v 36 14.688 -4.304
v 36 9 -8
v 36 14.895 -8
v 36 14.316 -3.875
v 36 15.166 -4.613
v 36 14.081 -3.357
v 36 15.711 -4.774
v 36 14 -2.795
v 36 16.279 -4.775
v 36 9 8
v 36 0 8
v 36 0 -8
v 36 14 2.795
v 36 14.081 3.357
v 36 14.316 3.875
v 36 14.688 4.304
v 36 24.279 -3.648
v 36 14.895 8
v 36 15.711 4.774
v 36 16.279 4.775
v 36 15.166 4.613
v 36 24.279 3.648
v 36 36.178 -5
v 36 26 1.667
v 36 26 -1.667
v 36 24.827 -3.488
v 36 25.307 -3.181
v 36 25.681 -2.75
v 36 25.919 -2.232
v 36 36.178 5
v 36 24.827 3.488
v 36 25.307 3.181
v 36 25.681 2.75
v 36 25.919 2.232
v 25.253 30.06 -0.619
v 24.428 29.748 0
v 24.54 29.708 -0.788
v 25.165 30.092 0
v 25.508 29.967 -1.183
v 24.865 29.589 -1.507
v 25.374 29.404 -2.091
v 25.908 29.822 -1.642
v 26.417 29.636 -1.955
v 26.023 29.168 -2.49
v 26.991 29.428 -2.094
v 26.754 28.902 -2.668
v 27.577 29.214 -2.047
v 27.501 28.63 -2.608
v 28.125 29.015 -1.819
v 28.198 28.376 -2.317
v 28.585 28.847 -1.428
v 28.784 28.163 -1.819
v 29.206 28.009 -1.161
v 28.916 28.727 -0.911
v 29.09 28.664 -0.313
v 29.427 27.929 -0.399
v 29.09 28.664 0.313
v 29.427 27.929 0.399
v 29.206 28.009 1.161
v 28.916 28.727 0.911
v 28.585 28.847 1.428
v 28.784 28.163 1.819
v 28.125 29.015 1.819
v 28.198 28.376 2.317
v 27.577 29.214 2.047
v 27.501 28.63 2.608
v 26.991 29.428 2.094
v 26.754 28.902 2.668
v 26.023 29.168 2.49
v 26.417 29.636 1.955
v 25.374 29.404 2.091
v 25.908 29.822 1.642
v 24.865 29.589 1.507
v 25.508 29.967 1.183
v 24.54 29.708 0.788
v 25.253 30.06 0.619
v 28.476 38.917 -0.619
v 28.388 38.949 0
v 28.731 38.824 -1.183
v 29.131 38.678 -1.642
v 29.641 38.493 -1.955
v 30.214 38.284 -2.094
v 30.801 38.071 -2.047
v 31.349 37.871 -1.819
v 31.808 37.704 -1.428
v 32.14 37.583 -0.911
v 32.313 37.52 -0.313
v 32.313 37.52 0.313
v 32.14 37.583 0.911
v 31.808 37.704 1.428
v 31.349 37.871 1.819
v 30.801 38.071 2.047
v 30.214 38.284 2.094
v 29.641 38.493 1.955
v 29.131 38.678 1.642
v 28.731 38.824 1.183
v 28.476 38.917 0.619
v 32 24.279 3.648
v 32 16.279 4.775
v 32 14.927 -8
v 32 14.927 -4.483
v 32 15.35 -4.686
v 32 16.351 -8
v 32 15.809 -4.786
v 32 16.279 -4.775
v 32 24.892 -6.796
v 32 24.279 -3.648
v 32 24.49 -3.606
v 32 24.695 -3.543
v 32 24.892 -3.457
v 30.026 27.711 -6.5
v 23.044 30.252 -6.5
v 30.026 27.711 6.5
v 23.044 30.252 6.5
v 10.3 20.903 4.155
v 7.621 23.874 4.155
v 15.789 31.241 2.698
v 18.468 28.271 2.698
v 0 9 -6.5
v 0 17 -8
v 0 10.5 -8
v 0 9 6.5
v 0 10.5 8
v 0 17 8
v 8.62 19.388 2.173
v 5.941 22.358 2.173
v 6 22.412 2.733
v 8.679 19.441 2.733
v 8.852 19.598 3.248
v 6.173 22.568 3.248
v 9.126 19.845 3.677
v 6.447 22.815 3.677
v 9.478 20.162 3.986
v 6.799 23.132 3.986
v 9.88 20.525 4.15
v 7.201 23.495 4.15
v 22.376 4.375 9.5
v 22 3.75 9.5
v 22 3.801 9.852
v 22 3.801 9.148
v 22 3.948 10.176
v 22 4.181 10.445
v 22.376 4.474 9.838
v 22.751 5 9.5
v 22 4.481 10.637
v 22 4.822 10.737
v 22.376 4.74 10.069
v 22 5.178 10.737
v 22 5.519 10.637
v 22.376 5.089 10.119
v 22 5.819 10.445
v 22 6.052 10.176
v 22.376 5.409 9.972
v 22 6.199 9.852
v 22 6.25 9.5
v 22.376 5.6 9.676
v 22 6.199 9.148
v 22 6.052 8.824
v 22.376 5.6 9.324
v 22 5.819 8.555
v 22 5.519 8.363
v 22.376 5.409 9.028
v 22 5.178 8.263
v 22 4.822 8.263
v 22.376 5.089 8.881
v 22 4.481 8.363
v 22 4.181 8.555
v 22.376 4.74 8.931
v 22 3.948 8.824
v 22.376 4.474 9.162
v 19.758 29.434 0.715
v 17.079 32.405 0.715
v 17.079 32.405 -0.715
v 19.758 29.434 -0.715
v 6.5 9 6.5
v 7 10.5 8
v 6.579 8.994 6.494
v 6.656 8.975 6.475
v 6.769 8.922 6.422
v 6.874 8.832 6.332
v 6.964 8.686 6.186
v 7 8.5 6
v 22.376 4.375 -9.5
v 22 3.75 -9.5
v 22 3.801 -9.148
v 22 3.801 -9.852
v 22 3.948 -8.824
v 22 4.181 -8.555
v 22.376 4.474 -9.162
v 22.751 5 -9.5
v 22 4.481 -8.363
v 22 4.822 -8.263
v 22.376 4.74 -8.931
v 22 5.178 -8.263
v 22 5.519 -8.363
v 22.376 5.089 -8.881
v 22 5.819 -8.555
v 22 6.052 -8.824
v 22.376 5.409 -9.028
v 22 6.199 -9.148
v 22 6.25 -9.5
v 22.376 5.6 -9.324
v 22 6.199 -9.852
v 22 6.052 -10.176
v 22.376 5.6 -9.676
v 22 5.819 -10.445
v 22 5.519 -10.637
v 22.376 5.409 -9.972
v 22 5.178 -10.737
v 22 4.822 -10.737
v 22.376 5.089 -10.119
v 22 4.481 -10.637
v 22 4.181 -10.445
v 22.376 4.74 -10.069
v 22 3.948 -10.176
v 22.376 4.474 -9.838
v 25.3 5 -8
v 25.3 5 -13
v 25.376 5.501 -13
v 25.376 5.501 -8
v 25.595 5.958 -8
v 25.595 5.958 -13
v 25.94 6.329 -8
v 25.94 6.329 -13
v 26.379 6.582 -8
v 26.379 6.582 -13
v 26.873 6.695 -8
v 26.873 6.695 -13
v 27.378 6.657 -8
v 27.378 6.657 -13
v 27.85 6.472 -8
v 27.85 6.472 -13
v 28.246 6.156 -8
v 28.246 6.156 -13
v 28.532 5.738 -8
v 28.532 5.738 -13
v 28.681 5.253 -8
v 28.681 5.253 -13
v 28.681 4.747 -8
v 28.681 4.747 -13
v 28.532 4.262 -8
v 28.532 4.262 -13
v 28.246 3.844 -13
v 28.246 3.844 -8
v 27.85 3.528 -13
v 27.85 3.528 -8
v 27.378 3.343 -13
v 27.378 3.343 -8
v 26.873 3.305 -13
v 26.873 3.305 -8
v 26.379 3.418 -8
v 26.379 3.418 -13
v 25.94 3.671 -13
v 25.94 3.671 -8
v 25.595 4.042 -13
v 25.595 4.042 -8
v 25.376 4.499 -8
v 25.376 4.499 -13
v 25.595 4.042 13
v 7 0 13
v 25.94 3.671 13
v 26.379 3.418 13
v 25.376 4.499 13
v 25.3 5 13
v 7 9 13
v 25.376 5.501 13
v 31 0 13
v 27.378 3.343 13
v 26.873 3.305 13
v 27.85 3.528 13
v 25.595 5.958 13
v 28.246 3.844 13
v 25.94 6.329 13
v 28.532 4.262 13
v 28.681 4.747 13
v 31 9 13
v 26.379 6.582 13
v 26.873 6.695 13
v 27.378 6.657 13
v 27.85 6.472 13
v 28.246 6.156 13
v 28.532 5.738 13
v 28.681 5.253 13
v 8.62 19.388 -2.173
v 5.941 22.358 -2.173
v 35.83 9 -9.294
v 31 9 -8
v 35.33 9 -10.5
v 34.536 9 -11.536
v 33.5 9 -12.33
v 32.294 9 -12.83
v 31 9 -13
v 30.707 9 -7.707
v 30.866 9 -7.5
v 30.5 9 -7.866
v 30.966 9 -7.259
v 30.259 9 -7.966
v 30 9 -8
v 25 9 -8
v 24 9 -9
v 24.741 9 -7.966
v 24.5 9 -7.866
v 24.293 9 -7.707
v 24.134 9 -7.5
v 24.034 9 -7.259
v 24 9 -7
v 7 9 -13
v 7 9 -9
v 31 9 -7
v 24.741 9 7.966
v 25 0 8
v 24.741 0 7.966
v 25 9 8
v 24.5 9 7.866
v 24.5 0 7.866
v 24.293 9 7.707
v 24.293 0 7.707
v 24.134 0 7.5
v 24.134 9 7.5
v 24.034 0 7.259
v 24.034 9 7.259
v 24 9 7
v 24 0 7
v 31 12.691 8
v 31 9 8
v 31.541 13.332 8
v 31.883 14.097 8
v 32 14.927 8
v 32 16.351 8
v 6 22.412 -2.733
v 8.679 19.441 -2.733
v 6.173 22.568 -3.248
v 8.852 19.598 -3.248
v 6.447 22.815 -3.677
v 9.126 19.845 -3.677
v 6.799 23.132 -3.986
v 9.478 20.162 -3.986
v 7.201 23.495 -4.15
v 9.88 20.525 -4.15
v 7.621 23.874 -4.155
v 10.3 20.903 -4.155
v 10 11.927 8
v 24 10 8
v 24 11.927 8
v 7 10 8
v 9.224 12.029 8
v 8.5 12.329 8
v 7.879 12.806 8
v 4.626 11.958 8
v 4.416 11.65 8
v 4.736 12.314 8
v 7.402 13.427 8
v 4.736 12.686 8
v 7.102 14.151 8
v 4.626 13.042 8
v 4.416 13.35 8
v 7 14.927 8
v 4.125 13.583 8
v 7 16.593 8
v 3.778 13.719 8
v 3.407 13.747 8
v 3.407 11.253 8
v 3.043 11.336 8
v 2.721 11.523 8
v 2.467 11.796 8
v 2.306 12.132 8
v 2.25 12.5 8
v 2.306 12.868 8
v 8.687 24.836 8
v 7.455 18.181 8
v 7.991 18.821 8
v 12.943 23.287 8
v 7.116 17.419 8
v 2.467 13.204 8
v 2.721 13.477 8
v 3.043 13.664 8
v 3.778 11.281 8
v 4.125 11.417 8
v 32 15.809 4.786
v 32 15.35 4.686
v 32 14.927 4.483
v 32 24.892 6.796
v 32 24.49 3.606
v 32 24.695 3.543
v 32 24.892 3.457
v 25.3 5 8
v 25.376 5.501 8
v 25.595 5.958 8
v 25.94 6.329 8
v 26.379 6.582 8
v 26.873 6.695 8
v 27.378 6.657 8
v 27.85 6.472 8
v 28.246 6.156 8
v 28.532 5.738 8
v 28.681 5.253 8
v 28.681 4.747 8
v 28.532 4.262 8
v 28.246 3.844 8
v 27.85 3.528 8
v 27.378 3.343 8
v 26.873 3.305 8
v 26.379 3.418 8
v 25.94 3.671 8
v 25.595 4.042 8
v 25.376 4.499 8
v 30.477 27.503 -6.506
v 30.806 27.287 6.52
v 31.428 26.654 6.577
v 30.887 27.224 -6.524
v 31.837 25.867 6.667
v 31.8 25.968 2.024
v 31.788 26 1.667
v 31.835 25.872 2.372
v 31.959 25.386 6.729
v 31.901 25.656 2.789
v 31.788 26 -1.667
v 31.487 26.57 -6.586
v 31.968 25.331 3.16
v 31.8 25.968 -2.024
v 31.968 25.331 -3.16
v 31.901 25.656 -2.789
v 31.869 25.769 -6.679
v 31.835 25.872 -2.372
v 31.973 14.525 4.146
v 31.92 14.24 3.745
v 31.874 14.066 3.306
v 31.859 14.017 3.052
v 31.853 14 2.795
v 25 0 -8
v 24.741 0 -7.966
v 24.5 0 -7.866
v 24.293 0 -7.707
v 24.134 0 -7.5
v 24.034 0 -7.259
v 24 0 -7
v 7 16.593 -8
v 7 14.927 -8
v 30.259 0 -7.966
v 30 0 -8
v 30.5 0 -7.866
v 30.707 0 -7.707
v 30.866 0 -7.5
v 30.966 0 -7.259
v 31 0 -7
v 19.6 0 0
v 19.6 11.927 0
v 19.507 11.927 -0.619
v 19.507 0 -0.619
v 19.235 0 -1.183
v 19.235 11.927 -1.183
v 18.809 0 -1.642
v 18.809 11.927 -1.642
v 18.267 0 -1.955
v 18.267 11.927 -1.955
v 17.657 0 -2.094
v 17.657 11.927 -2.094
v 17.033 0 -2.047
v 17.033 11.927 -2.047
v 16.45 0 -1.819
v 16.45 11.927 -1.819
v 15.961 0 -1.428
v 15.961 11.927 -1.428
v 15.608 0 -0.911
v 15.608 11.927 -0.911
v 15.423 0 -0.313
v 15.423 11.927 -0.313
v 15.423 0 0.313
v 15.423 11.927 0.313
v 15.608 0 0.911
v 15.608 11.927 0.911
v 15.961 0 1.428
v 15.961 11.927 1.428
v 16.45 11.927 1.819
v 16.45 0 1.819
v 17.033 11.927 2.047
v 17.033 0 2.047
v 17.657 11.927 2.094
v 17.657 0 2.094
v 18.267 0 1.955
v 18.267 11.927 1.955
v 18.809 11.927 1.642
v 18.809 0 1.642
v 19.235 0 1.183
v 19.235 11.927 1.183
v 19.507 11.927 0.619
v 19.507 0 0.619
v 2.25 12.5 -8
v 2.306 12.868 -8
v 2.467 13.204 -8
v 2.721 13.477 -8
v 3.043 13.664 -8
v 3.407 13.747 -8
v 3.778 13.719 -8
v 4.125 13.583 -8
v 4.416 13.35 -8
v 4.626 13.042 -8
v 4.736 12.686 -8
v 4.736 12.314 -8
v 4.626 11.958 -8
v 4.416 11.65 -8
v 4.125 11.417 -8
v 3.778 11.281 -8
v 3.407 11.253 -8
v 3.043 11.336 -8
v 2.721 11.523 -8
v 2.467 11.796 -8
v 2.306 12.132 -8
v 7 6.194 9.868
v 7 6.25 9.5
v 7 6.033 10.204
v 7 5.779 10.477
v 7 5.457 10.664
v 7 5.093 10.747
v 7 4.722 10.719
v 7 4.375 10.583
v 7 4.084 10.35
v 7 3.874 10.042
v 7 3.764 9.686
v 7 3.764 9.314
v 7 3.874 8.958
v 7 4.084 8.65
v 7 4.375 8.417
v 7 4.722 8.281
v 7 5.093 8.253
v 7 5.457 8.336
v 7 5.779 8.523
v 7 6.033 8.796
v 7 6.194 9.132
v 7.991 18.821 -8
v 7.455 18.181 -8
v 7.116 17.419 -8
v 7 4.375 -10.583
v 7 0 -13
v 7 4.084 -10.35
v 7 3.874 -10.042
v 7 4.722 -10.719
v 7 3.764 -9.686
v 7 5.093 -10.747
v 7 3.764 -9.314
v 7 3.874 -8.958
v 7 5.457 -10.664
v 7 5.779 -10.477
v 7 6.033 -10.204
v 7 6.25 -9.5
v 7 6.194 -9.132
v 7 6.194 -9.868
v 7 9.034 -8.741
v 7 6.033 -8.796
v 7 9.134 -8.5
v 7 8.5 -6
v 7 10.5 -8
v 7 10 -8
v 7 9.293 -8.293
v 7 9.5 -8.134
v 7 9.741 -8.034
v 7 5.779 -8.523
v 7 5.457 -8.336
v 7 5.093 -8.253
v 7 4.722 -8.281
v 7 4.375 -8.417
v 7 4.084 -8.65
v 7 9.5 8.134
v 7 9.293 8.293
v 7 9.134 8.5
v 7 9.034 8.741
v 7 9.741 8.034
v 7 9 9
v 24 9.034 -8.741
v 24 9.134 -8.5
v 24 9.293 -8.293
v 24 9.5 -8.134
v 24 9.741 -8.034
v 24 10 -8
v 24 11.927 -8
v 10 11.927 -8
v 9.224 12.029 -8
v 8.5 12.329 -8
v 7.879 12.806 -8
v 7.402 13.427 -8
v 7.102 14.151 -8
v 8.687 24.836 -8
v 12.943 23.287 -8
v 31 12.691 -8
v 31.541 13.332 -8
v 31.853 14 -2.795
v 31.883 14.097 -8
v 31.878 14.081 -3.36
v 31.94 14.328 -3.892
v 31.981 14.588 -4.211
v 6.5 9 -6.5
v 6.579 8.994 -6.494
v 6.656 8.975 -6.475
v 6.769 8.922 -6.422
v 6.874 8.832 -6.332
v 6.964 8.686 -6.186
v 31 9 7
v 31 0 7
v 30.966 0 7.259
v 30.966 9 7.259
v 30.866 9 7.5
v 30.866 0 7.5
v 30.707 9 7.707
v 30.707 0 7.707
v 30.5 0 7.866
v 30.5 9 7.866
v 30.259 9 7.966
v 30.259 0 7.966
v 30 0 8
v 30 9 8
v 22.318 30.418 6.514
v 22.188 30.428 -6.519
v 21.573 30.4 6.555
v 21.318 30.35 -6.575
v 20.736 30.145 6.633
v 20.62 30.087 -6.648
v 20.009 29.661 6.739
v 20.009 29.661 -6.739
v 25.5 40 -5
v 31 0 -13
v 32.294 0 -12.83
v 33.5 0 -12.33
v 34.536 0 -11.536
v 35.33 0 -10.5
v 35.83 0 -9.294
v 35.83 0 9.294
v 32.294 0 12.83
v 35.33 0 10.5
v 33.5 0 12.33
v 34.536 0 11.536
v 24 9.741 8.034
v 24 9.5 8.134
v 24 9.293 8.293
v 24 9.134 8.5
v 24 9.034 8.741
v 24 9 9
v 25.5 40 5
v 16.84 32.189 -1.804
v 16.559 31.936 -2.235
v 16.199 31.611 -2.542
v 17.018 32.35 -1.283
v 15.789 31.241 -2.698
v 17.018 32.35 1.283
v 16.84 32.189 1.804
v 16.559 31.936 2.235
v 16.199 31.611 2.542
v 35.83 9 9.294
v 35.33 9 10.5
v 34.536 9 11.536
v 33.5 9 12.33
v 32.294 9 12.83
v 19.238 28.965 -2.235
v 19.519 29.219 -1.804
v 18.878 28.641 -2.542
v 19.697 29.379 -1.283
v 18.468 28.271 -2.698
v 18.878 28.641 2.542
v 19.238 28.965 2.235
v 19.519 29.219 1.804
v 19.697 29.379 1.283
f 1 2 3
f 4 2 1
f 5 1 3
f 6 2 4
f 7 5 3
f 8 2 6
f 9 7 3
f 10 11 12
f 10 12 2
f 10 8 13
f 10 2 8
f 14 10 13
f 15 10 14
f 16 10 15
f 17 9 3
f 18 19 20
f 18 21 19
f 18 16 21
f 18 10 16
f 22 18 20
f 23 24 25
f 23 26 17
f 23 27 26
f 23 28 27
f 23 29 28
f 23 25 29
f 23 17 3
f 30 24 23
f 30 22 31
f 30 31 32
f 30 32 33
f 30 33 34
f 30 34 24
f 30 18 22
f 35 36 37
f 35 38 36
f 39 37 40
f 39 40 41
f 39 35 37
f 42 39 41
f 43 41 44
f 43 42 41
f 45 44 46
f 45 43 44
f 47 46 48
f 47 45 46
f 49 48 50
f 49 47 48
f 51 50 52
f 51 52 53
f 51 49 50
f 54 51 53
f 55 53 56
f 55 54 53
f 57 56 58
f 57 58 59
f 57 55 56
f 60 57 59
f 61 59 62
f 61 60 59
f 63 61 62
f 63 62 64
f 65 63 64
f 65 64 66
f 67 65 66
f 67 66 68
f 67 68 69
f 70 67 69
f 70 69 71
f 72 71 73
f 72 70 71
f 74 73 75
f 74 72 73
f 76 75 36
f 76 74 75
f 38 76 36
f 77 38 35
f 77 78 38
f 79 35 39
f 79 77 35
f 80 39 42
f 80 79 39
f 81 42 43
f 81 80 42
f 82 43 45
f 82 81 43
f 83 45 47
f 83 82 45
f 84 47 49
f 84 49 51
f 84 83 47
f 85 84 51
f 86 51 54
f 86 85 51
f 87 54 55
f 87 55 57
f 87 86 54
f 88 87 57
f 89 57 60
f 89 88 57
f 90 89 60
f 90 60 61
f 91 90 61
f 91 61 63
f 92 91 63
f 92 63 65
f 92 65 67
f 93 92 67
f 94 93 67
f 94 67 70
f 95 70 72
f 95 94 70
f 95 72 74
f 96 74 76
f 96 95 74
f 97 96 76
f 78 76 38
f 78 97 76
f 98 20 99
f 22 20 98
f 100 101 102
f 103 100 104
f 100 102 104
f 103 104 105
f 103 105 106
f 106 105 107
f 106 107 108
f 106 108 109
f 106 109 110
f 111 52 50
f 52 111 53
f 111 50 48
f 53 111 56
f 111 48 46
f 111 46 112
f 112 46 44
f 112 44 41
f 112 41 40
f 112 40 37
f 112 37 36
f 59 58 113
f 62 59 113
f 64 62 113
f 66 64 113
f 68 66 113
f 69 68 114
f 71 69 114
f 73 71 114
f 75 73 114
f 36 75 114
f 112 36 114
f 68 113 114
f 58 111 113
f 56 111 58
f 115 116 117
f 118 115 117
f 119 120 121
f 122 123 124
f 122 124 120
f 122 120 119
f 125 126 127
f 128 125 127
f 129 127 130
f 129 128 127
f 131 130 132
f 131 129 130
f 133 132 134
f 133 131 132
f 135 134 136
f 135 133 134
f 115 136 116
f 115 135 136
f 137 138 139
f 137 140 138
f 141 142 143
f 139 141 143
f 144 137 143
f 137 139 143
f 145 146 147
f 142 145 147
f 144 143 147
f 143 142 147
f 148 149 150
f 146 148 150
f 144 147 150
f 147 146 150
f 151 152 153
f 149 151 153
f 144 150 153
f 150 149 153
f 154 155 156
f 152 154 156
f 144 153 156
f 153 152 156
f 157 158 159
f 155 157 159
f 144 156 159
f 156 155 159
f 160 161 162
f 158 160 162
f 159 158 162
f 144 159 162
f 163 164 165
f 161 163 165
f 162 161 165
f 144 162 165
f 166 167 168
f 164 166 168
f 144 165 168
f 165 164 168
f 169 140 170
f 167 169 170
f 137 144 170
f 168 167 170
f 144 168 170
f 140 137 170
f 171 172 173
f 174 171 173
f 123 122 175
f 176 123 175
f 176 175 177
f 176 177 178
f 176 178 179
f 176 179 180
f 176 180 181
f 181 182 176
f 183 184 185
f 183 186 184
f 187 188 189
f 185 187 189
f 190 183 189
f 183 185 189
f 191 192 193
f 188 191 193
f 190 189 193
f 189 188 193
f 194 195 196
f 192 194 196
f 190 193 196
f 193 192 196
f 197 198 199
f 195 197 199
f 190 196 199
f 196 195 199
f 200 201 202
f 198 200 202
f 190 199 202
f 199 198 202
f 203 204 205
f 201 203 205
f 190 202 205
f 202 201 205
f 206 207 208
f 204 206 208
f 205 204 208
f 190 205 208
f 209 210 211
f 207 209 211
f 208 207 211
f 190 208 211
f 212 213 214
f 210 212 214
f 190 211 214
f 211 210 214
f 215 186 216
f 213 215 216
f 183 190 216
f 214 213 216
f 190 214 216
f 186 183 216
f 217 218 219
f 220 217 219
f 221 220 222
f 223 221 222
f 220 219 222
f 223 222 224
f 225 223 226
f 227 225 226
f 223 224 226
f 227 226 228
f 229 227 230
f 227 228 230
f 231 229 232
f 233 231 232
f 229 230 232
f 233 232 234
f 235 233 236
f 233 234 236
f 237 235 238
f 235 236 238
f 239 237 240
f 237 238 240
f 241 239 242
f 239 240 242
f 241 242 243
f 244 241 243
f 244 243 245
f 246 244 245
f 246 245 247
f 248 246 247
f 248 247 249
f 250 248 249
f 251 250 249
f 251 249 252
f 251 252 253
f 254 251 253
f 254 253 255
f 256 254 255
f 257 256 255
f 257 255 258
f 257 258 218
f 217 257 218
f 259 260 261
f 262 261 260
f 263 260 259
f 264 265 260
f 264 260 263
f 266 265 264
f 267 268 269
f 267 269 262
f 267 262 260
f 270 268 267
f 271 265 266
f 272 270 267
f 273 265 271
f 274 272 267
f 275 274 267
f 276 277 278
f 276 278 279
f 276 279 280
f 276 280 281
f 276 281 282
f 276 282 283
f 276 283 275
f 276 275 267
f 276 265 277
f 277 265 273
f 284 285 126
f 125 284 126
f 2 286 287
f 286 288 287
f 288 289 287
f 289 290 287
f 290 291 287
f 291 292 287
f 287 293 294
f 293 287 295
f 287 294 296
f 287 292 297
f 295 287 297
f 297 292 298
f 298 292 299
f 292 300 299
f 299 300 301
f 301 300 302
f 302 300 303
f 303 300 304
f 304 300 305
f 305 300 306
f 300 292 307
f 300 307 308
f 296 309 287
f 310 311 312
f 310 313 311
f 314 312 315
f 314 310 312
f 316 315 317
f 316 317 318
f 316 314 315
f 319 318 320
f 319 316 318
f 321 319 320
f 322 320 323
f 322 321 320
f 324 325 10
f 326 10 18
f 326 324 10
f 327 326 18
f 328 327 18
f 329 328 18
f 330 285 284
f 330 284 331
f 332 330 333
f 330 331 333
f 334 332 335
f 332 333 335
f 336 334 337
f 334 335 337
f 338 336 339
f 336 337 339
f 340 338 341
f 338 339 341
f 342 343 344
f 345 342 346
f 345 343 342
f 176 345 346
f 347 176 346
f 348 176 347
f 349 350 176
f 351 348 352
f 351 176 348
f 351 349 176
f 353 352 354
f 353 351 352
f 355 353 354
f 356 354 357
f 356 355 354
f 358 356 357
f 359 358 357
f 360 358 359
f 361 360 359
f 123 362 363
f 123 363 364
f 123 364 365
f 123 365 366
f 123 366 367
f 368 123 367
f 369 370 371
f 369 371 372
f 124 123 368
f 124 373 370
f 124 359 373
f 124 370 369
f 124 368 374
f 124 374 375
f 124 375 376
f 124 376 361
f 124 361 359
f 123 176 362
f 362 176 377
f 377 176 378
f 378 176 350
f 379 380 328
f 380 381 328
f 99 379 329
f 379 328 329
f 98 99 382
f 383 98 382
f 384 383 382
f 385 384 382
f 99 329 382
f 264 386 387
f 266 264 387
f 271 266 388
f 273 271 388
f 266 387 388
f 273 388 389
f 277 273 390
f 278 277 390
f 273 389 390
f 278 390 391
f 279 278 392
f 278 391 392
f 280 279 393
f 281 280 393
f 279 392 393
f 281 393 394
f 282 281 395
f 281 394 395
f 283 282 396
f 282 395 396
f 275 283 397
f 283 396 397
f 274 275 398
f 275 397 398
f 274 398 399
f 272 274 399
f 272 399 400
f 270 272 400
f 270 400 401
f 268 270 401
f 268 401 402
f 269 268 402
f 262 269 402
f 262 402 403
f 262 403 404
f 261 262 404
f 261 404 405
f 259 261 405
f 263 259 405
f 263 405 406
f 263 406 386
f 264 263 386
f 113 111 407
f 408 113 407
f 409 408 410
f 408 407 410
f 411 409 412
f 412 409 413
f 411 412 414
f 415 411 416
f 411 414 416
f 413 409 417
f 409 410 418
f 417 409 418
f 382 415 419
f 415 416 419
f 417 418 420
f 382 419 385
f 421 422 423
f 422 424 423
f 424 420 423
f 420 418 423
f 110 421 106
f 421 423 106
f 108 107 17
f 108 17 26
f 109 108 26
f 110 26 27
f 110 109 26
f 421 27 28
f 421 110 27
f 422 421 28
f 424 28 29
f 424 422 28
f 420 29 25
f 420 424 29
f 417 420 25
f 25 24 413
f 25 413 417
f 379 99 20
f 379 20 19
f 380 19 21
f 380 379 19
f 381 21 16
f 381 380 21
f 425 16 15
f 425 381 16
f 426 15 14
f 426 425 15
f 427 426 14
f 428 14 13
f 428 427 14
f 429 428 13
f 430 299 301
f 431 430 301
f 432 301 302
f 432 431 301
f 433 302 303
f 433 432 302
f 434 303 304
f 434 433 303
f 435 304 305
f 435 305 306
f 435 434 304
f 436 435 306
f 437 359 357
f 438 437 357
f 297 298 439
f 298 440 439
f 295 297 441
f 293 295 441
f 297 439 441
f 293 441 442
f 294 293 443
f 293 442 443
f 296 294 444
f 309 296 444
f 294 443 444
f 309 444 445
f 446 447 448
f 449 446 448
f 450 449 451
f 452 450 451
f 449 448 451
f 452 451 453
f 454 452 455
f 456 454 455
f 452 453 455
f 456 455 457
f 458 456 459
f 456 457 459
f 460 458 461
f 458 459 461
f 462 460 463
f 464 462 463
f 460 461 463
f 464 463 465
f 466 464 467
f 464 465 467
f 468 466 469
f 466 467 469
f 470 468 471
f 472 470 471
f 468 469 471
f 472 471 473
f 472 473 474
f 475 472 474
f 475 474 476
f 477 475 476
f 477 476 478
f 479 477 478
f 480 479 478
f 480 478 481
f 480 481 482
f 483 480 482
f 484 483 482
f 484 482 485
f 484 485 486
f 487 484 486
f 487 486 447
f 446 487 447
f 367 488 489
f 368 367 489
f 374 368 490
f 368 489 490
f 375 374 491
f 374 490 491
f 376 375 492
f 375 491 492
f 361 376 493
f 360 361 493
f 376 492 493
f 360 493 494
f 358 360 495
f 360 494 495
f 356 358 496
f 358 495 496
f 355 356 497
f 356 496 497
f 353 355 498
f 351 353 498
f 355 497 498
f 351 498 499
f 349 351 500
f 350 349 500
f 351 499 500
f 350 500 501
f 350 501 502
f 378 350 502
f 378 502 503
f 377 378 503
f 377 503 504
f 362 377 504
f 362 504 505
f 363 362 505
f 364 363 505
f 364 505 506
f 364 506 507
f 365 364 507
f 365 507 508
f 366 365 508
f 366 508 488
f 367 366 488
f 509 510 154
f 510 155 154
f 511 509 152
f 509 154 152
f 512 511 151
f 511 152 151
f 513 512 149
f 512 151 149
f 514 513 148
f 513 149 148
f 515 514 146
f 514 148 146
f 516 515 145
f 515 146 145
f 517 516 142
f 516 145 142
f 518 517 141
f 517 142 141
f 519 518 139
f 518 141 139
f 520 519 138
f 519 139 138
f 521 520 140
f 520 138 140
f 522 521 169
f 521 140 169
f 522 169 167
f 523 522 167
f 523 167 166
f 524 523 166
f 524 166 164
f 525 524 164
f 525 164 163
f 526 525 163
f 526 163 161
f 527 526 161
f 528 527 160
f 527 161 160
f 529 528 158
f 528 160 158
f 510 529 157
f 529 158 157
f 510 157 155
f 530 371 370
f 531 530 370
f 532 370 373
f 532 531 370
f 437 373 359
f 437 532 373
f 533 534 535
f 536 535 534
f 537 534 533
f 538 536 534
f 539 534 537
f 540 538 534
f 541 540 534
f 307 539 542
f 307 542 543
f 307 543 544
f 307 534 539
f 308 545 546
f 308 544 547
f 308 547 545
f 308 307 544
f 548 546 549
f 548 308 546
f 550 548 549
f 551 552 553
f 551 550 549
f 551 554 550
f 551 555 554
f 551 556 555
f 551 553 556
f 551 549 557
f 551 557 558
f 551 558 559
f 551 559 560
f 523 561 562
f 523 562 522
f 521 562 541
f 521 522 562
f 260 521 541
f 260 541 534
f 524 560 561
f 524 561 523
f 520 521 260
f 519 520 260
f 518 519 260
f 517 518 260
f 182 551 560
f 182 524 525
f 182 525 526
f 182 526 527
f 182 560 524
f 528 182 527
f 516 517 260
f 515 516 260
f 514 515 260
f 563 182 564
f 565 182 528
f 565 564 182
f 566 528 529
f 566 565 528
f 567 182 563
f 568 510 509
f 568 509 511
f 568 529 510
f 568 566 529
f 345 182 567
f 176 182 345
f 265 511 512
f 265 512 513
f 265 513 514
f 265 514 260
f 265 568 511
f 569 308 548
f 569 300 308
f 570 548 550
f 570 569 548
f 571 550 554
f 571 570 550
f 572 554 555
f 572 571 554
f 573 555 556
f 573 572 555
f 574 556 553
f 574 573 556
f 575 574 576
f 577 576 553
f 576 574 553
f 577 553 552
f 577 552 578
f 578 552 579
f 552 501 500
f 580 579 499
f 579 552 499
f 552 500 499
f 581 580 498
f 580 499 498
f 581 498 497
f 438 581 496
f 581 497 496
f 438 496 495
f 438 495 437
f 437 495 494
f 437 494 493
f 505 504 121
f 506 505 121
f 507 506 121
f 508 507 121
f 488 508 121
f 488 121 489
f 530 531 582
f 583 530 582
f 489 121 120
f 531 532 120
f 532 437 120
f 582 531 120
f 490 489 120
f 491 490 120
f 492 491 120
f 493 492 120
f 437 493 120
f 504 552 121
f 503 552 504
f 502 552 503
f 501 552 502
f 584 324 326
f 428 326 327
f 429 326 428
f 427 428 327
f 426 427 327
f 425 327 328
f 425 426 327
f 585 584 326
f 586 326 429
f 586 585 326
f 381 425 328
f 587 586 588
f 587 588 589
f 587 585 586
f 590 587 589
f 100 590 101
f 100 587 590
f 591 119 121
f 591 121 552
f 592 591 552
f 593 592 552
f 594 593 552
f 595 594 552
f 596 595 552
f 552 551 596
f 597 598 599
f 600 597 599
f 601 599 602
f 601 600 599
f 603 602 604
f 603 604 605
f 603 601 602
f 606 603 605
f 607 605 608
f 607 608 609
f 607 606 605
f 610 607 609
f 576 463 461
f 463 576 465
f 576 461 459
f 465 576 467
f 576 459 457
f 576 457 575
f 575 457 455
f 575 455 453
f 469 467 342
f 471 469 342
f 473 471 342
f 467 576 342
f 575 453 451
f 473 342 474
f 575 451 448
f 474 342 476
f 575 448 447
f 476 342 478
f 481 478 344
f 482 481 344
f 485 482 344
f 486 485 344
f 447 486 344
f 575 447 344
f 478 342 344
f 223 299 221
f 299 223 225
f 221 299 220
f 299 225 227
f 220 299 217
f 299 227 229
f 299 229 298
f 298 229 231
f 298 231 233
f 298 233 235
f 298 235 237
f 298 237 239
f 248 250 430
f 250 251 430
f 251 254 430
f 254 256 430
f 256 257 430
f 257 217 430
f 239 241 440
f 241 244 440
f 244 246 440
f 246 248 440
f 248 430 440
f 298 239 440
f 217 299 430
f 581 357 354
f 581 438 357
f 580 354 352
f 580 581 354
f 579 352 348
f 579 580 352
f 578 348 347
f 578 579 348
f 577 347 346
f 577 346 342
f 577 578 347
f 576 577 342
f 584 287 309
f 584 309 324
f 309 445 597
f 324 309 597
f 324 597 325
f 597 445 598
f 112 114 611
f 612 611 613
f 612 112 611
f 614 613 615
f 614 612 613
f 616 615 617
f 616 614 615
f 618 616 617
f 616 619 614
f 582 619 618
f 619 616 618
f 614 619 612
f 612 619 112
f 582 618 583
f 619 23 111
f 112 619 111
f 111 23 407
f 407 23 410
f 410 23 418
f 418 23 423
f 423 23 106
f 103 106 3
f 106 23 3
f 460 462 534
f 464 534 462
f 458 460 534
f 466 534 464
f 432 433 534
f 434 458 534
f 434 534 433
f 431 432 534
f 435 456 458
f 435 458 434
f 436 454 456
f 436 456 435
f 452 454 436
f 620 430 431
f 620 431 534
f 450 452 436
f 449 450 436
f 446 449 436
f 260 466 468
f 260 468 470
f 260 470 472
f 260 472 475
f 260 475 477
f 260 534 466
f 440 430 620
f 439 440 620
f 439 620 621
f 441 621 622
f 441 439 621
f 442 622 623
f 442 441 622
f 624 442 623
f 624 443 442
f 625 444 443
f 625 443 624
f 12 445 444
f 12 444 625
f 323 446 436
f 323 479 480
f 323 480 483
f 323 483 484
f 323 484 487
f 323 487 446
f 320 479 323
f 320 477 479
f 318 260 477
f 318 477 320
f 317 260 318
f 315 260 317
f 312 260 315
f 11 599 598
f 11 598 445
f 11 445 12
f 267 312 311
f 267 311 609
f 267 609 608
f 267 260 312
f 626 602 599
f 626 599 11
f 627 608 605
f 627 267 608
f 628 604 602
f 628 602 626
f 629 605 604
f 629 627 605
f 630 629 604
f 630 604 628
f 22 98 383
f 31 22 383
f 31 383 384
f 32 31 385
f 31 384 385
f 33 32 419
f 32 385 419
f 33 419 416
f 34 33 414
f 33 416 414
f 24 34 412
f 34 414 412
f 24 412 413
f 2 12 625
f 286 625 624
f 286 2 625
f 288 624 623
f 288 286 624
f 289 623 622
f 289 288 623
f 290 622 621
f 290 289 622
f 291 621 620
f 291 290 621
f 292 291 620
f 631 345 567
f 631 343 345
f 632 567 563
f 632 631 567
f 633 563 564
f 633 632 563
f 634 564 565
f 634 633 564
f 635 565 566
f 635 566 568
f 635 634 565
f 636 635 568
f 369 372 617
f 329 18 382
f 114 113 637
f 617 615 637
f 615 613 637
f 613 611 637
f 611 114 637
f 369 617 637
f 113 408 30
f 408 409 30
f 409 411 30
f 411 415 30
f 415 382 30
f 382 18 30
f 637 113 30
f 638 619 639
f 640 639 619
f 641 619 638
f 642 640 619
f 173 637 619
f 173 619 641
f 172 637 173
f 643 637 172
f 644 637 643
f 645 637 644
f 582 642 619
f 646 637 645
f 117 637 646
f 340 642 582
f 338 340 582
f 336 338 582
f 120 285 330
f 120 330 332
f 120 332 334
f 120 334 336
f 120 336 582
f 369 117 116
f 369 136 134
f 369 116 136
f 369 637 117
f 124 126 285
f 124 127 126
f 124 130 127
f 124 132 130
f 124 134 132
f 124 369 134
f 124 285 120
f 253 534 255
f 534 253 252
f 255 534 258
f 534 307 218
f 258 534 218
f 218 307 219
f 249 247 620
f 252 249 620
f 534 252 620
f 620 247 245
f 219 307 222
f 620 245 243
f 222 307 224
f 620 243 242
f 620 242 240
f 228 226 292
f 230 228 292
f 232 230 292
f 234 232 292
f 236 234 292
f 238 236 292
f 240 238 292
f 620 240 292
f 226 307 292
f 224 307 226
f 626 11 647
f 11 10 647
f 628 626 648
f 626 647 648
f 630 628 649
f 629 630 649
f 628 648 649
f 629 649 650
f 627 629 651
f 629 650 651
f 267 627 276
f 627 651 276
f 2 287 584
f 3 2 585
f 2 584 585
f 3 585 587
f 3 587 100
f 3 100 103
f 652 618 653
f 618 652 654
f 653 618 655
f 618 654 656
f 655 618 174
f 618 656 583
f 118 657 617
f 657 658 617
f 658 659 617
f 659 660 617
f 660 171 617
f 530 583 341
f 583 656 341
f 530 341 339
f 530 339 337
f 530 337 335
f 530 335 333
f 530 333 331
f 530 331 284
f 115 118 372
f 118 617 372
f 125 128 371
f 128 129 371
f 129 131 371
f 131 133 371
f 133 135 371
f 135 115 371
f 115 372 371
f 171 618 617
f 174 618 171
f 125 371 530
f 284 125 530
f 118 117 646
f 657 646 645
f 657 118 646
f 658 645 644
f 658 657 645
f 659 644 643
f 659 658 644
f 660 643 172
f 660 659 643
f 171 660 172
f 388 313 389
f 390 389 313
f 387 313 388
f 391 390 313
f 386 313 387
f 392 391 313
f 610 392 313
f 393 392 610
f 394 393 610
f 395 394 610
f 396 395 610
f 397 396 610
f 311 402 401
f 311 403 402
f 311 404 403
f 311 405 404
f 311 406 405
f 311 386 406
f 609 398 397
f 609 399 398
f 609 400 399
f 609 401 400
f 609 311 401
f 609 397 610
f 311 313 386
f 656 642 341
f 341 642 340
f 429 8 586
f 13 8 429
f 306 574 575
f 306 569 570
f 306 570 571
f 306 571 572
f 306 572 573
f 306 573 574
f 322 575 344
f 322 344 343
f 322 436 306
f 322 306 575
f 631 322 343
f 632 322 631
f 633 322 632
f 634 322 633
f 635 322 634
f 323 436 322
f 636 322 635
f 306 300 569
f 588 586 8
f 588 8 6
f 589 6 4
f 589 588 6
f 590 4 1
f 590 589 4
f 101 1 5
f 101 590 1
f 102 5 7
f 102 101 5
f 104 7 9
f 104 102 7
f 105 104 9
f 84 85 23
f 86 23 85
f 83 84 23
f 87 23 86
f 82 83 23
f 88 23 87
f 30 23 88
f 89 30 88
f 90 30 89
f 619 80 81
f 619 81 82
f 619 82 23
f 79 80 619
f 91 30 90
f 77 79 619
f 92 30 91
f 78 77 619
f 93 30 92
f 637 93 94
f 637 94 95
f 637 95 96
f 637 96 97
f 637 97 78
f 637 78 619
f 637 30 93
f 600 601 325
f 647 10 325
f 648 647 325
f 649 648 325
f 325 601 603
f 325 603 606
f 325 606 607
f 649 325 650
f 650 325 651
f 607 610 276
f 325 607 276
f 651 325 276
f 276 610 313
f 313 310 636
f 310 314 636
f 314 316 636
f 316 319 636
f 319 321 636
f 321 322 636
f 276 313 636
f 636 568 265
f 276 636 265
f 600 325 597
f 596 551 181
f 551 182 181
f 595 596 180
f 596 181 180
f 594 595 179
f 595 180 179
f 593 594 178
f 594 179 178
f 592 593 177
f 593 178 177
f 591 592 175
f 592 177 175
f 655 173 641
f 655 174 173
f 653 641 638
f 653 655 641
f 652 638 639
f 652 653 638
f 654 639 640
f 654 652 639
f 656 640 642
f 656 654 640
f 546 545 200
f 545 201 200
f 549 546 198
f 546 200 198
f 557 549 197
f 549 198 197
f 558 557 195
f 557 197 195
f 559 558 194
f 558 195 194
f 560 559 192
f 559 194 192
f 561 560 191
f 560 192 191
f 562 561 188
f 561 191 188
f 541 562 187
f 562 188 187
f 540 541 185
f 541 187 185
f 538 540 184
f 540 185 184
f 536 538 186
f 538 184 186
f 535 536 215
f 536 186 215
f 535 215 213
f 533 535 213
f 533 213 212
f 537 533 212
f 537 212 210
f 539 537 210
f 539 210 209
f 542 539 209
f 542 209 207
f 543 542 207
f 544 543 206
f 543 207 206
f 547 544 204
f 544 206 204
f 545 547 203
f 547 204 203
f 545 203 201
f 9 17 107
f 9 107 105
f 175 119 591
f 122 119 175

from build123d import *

# Parameters (mm, degrees)
BOSS_EXTRUDE1_DEPTH       = 13
SKETCH2_W                 = 26
SKETCH2_H                 = 9
CUT_EXTRUDE1_DEPTH        = 7
SKETCH3_W                 = 5.460158558
SKETCH3_H                 = 35.727642342
SKETCH3_W_2               = 6.990786849
SKETCH3_H_2               = 37.804269356
CUT_EXTRUDE2_DEPTH        = 56.362442143
M3X0_5_TAPPED_HOLE2_D     = 2.5
M3X0_5_TAPPED_HOLE2_DEPTH = 15
M3X0_5_TAPPED_HOLE2_TIP   = 0.751075774
M3X0_5_TAPPED_HOLE1_D     = 2.5
M3_CLEARANCE_HOLE1_D      = 3.4
CUT_EXTRUDE3_DEPTH        = 58.766772456
FILLET2_R                 = 3
CHAMFER1_SIZE             = 20
CHAMFER1_SIZE_2           = 3
CUT_EXTRUDE4_REACH        = 57.362
FILLET3_R                 = 2
CUT_EXTRUDE5_REACH        = 57.527
FILLET4_R                 = 2
M5X0_8_TAPPED_HOLE1_D     = 4.2
M5X0_8_TAPPED_HOLE1_DEPTH = 11.927025935
FILLET6_R                 = 5
CUT_EXTRUDE6_REACH        = 57.362
SKETCH19_W                = 7
SKETCH19_H                = 16
FILLET7_R                 = 1
CHAMFER2_SIZE             = 1.5
FILLET8_R                 = 0.5
FILLET9_R                 = 1


with BuildPart() as part:
    # Sketch1 → Boss-Extrude1 (new, symmetric)
    with BuildSketch(Plane.XY):
        Polygon((0, 0), (36, 0), (36, 36.17831254), (25.5, 40), (0, 17), align=None)
    extrude(amount=BOSS_EXTRUDE1_DEPTH, both=True)

    # Sketch2 → Cut-Extrude1 (cut)
    with BuildSketch(Plane.ZY):
        with Locations((0, 4.5)):
            Rectangle(SKETCH2_W, SKETCH2_H)
    extrude(amount=-CUT_EXTRUDE1_DEPTH, mode=Mode.SUBTRACT)

    # Sketch3 → Cut-Extrude2 (cut, through all)
    with BuildSketch(Plane.ZY):
        with Locations((10.730079279, 26.863821171)):
            Rectangle(SKETCH3_W, SKETCH3_H)
        with Locations((-11.495393425, 27.902134678)):
            Rectangle(SKETCH3_W_2, SKETCH3_H_2)
    extrude(amount=-CUT_EXTRUDE2_DEPTH, mode=Mode.SUBTRACT)

    # M3x0.5 Tapped Hole2
    with Locations(Plane(origin=(7, 5, -9.5), x_dir=(0, -1, 0), z_dir=(-1, 0, 0))):
        with Locations((0, 0), (0, 19)):
            Hole(M3X0_5_TAPPED_HOLE2_D / 2, depth=M3X0_5_TAPPED_HOLE2_DEPTH)
            with Locations((0, 0, -(M3X0_5_TAPPED_HOLE2_DEPTH + M3X0_5_TAPPED_HOLE2_TIP / 2))):  # 118° drill point
                Cone(0, M3X0_5_TAPPED_HOLE2_D / 2, M3X0_5_TAPPED_HOLE2_TIP, mode=Mode.SUBTRACT)

    # M3x0.5 Tapped Hole1 (through all)
    with Locations(Plane(origin=(3.5, 12.5, 8), x_dir=(1, 0, 0), z_dir=(0, 0, 1))):
        with Locations((0, 0)):
            Hole(M3X0_5_TAPPED_HOLE1_D / 2)

    # M3 Clearance Hole1 (through all)
    with Locations(Plane.XY.offset(13)):
        with Locations((27, 5)):
            Hole(M3_CLEARANCE_HOLE1_D / 2)

    # Sketch13 → Cut-Extrude3 (cut, through all)
    with BuildSketch(Plane.XY.offset(8)):
        Polygon((32, 18.871173631), (32, 26.992415753), (21.34884319, 30.869119792), (7, 17.927025935), (7, 11.927025935), (32, 11.927025935), align=None)
    extrude(amount=-CUT_EXTRUDE3_DEPTH, mode=Mode.SUBTRACT)

    # Fillet2
    fillet2_edges = [part.edges().sort_by_distance(p)[0] for p in [
        (7, 11.927025935, 0),
        (7, 17.927025935, 0),
        (21.34884319, 30.869119792, 0),
        (32, 26.992415753, 0),
        (32, 11.927025935, 0),
    ]]
    fillet(fillet2_edges, radius=FILLET2_R)

    # Chamfer1
    # the kernel refuses this chamfer: 20, 3 mm, written as the material it takes off along each edge
    with BuildSketch(Plane(origin=(84.844019059, 18.400543481, 8), x_dir=(-0.3420145720677014, -0.939677313880462, 0.005707737883485923), z_dir=(-0.9396926207859104, 0.3420201433256634, 0))) as chamfer1_piece_1:
        Polygon((CHAMFER1_SIZE * 0.999983710731, -CHAMFER1_SIZE * 0.00570773788349), (-CHAMFER1_SIZE_2 * 0.00570773788349, -CHAMFER1_SIZE_2 * 0.999983710731), (0, 0), align=None)
    extrude(amount=115.131305413, mode=Mode.SUBTRACT)
    with BuildSketch(Plane(origin=(84.844019059, 18.400543481, -8), x_dir=(0.08410022637244834, 0.23106347292932808, 0.9692970769593502), z_dir=(-0.9396926207859104, 0.3420201433256634, 0))) as chamfer1_piece_2:
        Polygon((CHAMFER1_SIZE_2 * 0.969297076959, -CHAMFER1_SIZE_2 * 0.245892611922), (-CHAMFER1_SIZE * 0.245892611922, -CHAMFER1_SIZE * 0.969297076959), (0, 0), align=None)
    extrude(amount=115.131305413, mode=Mode.SUBTRACT)

    # Sketch14 → Cut-Extrude4 (cut, up to next)
    with BuildSketch(Plane(origin=(36, 0, 0), x_dir=(0, 0, -1), z_dir=(1, 0, 0)), mode=Mode.PRIVATE) as cut_extrude4_sk1:
        Polygon((-3.405017352, 26), (3.405017352, 26), (5.096464069, 14), (-5.096464069, 14), align=None)
    cut_extrude4_tool1 = extrude(cut_extrude4_sk1.sketch, amount=-CUT_EXTRUDE4_REACH, mode=Mode.PRIVATE) & part.part
    add(cut_extrude4_tool1.solids().sort_by_distance((36, 19.602082, 0))[0], mode=Mode.SUBTRACT)

    # Fillet3
    fillet3_edges = [part.edges().sort_by_distance(p)[0] for p in [
        (33.926588844, 14, -5.096464069),
        (33.926588844, 14, 5.096464069),
        (33.893904368, 26, -3.405017352),
        (33.893904368, 26, 3.405017352),
    ]]
    fillet(fillet3_edges, radius=FILLET3_R)

    # Sketch16 → Cut-Extrude5 (cut, up to next)
    with BuildSketch(Plane(origin=(-8.45495018, 9.373966504, 0), x_dir=(0.7425697235686507, 0.669768770277607, 0), z_dir=(-0.669768770277607, 0.7425697235686507, 0)), mode=Mode.PRIVATE) as cut_extrude5_sk1:
        Polygon((19.386069095, 4.455184815), (19.386069095, -4.455184815), (34.386069095, -2.467646022), (34.386069095, 2.467646022), align=None)
    cut_extrude5_tool1 = extrude(cut_extrude5_sk1.sketch, amount=-CUT_EXTRUDE5_REACH, mode=Mode.PRIVATE) & part.part
    add(cut_extrude5_tool1.solids().sort_by_distance((10.976853, 26.900691, 0))[0], mode=Mode.SUBTRACT)

    # Fillet4
    fillet4_edges = [part.edges().sort_by_distance(p)[0] for p in [
        (7.280095329, 20.873010715, -4.455184815),
        (18.418641183, 30.919542269, -2.467646022),
        (18.418641183, 30.919542269, 2.467646022),
        (7.280095329, 20.873010715, 4.455184815),
    ]]
    fillet(fillet4_edges, radius=FILLET4_R)

    # M5x0.8 Tapped Hole1
    with Locations(Plane(origin=(0, 0, 0), x_dir=(-1, 0, 0), z_dir=(0, -1, 0))):
        with Locations((-17.5, 0)):
            Hole(M5X0_8_TAPPED_HOLE1_D / 2, depth=M5X0_8_TAPPED_HOLE1_DEPTH)

    # Fillet6
    fillet6_edges = [part.edges().sort_by_distance(p)[0] for p in [
        (36, 4.5, 13),
        (36, 4.5, -13),
    ]]
    fillet(fillet6_edges, radius=FILLET6_R)

    # Sketch19 → Cut-Extrude6 (cut, up to next)
    with BuildSketch(Plane.XZ, mode=Mode.PRIVATE) as cut_extrude6_sk1:
        with Locations((27.5, 0)):
            Rectangle(SKETCH19_W, SKETCH19_H)
    cut_extrude6_tool1 = extrude(cut_extrude6_sk1.sketch, amount=-CUT_EXTRUDE6_REACH, mode=Mode.PRIVATE) & part.part
    add(cut_extrude6_tool1.solids().sort_by_distance((27.5, 0, 0))[0], mode=Mode.SUBTRACT)

    # Fillet7
    fillet7_edges = [part.edges().sort_by_distance(p)[0] for p in [
        (24, 4.5, 8),
        (31, 4.5, -8),
        (24, 4.5, -8),
        (31, 4.5, 8),
    ]]
    fillet(fillet7_edges, radius=FILLET7_R)

    # Sketch21 → M5x0.8 Tapped Hole2 (revolve, cut)
    with BuildSketch(Plane(origin=(30.361844275, 38.2304334, 0), x_dir=(-0.9396926207859102, 0.3420201433256637, 0), z_dir=(0, 0, 1))):
        Polygon((0, 0), (0, 10), (2.675, 10), (2.1, 9.425), (2.1, 0), align=None)
    revolve(axis=Axis((32.533672185, 44.197481542, 0), (-0.3420201433256637, -0.9396926207859103, 0)), mode=Mode.SUBTRACT)

    # Chamfer2
    chamfer2_edges = [part.edges().sort_by_distance(p)[0] for p in [
        (3.5, 9, 8),
        (3.5, 9, -8),
    ]]
    chamfer(chamfer2_edges, length=CHAMFER2_SIZE)

    # Fillet8
    fillet8_edges = [part.edges().sort_by_distance(p)[0] for p in [
        (7, 9, 0),
    ]]
    fillet(fillet8_edges, radius=FILLET8_R)

    # Fillet9
    fillet9_edges = [part.edges().sort_by_distance(p)[0] for p in [
        (15.5, 9, 8),
        (15.5, 9, -8),
    ]]
    fillet(fillet9_edges, radius=FILLET9_R)


solid = part.part
